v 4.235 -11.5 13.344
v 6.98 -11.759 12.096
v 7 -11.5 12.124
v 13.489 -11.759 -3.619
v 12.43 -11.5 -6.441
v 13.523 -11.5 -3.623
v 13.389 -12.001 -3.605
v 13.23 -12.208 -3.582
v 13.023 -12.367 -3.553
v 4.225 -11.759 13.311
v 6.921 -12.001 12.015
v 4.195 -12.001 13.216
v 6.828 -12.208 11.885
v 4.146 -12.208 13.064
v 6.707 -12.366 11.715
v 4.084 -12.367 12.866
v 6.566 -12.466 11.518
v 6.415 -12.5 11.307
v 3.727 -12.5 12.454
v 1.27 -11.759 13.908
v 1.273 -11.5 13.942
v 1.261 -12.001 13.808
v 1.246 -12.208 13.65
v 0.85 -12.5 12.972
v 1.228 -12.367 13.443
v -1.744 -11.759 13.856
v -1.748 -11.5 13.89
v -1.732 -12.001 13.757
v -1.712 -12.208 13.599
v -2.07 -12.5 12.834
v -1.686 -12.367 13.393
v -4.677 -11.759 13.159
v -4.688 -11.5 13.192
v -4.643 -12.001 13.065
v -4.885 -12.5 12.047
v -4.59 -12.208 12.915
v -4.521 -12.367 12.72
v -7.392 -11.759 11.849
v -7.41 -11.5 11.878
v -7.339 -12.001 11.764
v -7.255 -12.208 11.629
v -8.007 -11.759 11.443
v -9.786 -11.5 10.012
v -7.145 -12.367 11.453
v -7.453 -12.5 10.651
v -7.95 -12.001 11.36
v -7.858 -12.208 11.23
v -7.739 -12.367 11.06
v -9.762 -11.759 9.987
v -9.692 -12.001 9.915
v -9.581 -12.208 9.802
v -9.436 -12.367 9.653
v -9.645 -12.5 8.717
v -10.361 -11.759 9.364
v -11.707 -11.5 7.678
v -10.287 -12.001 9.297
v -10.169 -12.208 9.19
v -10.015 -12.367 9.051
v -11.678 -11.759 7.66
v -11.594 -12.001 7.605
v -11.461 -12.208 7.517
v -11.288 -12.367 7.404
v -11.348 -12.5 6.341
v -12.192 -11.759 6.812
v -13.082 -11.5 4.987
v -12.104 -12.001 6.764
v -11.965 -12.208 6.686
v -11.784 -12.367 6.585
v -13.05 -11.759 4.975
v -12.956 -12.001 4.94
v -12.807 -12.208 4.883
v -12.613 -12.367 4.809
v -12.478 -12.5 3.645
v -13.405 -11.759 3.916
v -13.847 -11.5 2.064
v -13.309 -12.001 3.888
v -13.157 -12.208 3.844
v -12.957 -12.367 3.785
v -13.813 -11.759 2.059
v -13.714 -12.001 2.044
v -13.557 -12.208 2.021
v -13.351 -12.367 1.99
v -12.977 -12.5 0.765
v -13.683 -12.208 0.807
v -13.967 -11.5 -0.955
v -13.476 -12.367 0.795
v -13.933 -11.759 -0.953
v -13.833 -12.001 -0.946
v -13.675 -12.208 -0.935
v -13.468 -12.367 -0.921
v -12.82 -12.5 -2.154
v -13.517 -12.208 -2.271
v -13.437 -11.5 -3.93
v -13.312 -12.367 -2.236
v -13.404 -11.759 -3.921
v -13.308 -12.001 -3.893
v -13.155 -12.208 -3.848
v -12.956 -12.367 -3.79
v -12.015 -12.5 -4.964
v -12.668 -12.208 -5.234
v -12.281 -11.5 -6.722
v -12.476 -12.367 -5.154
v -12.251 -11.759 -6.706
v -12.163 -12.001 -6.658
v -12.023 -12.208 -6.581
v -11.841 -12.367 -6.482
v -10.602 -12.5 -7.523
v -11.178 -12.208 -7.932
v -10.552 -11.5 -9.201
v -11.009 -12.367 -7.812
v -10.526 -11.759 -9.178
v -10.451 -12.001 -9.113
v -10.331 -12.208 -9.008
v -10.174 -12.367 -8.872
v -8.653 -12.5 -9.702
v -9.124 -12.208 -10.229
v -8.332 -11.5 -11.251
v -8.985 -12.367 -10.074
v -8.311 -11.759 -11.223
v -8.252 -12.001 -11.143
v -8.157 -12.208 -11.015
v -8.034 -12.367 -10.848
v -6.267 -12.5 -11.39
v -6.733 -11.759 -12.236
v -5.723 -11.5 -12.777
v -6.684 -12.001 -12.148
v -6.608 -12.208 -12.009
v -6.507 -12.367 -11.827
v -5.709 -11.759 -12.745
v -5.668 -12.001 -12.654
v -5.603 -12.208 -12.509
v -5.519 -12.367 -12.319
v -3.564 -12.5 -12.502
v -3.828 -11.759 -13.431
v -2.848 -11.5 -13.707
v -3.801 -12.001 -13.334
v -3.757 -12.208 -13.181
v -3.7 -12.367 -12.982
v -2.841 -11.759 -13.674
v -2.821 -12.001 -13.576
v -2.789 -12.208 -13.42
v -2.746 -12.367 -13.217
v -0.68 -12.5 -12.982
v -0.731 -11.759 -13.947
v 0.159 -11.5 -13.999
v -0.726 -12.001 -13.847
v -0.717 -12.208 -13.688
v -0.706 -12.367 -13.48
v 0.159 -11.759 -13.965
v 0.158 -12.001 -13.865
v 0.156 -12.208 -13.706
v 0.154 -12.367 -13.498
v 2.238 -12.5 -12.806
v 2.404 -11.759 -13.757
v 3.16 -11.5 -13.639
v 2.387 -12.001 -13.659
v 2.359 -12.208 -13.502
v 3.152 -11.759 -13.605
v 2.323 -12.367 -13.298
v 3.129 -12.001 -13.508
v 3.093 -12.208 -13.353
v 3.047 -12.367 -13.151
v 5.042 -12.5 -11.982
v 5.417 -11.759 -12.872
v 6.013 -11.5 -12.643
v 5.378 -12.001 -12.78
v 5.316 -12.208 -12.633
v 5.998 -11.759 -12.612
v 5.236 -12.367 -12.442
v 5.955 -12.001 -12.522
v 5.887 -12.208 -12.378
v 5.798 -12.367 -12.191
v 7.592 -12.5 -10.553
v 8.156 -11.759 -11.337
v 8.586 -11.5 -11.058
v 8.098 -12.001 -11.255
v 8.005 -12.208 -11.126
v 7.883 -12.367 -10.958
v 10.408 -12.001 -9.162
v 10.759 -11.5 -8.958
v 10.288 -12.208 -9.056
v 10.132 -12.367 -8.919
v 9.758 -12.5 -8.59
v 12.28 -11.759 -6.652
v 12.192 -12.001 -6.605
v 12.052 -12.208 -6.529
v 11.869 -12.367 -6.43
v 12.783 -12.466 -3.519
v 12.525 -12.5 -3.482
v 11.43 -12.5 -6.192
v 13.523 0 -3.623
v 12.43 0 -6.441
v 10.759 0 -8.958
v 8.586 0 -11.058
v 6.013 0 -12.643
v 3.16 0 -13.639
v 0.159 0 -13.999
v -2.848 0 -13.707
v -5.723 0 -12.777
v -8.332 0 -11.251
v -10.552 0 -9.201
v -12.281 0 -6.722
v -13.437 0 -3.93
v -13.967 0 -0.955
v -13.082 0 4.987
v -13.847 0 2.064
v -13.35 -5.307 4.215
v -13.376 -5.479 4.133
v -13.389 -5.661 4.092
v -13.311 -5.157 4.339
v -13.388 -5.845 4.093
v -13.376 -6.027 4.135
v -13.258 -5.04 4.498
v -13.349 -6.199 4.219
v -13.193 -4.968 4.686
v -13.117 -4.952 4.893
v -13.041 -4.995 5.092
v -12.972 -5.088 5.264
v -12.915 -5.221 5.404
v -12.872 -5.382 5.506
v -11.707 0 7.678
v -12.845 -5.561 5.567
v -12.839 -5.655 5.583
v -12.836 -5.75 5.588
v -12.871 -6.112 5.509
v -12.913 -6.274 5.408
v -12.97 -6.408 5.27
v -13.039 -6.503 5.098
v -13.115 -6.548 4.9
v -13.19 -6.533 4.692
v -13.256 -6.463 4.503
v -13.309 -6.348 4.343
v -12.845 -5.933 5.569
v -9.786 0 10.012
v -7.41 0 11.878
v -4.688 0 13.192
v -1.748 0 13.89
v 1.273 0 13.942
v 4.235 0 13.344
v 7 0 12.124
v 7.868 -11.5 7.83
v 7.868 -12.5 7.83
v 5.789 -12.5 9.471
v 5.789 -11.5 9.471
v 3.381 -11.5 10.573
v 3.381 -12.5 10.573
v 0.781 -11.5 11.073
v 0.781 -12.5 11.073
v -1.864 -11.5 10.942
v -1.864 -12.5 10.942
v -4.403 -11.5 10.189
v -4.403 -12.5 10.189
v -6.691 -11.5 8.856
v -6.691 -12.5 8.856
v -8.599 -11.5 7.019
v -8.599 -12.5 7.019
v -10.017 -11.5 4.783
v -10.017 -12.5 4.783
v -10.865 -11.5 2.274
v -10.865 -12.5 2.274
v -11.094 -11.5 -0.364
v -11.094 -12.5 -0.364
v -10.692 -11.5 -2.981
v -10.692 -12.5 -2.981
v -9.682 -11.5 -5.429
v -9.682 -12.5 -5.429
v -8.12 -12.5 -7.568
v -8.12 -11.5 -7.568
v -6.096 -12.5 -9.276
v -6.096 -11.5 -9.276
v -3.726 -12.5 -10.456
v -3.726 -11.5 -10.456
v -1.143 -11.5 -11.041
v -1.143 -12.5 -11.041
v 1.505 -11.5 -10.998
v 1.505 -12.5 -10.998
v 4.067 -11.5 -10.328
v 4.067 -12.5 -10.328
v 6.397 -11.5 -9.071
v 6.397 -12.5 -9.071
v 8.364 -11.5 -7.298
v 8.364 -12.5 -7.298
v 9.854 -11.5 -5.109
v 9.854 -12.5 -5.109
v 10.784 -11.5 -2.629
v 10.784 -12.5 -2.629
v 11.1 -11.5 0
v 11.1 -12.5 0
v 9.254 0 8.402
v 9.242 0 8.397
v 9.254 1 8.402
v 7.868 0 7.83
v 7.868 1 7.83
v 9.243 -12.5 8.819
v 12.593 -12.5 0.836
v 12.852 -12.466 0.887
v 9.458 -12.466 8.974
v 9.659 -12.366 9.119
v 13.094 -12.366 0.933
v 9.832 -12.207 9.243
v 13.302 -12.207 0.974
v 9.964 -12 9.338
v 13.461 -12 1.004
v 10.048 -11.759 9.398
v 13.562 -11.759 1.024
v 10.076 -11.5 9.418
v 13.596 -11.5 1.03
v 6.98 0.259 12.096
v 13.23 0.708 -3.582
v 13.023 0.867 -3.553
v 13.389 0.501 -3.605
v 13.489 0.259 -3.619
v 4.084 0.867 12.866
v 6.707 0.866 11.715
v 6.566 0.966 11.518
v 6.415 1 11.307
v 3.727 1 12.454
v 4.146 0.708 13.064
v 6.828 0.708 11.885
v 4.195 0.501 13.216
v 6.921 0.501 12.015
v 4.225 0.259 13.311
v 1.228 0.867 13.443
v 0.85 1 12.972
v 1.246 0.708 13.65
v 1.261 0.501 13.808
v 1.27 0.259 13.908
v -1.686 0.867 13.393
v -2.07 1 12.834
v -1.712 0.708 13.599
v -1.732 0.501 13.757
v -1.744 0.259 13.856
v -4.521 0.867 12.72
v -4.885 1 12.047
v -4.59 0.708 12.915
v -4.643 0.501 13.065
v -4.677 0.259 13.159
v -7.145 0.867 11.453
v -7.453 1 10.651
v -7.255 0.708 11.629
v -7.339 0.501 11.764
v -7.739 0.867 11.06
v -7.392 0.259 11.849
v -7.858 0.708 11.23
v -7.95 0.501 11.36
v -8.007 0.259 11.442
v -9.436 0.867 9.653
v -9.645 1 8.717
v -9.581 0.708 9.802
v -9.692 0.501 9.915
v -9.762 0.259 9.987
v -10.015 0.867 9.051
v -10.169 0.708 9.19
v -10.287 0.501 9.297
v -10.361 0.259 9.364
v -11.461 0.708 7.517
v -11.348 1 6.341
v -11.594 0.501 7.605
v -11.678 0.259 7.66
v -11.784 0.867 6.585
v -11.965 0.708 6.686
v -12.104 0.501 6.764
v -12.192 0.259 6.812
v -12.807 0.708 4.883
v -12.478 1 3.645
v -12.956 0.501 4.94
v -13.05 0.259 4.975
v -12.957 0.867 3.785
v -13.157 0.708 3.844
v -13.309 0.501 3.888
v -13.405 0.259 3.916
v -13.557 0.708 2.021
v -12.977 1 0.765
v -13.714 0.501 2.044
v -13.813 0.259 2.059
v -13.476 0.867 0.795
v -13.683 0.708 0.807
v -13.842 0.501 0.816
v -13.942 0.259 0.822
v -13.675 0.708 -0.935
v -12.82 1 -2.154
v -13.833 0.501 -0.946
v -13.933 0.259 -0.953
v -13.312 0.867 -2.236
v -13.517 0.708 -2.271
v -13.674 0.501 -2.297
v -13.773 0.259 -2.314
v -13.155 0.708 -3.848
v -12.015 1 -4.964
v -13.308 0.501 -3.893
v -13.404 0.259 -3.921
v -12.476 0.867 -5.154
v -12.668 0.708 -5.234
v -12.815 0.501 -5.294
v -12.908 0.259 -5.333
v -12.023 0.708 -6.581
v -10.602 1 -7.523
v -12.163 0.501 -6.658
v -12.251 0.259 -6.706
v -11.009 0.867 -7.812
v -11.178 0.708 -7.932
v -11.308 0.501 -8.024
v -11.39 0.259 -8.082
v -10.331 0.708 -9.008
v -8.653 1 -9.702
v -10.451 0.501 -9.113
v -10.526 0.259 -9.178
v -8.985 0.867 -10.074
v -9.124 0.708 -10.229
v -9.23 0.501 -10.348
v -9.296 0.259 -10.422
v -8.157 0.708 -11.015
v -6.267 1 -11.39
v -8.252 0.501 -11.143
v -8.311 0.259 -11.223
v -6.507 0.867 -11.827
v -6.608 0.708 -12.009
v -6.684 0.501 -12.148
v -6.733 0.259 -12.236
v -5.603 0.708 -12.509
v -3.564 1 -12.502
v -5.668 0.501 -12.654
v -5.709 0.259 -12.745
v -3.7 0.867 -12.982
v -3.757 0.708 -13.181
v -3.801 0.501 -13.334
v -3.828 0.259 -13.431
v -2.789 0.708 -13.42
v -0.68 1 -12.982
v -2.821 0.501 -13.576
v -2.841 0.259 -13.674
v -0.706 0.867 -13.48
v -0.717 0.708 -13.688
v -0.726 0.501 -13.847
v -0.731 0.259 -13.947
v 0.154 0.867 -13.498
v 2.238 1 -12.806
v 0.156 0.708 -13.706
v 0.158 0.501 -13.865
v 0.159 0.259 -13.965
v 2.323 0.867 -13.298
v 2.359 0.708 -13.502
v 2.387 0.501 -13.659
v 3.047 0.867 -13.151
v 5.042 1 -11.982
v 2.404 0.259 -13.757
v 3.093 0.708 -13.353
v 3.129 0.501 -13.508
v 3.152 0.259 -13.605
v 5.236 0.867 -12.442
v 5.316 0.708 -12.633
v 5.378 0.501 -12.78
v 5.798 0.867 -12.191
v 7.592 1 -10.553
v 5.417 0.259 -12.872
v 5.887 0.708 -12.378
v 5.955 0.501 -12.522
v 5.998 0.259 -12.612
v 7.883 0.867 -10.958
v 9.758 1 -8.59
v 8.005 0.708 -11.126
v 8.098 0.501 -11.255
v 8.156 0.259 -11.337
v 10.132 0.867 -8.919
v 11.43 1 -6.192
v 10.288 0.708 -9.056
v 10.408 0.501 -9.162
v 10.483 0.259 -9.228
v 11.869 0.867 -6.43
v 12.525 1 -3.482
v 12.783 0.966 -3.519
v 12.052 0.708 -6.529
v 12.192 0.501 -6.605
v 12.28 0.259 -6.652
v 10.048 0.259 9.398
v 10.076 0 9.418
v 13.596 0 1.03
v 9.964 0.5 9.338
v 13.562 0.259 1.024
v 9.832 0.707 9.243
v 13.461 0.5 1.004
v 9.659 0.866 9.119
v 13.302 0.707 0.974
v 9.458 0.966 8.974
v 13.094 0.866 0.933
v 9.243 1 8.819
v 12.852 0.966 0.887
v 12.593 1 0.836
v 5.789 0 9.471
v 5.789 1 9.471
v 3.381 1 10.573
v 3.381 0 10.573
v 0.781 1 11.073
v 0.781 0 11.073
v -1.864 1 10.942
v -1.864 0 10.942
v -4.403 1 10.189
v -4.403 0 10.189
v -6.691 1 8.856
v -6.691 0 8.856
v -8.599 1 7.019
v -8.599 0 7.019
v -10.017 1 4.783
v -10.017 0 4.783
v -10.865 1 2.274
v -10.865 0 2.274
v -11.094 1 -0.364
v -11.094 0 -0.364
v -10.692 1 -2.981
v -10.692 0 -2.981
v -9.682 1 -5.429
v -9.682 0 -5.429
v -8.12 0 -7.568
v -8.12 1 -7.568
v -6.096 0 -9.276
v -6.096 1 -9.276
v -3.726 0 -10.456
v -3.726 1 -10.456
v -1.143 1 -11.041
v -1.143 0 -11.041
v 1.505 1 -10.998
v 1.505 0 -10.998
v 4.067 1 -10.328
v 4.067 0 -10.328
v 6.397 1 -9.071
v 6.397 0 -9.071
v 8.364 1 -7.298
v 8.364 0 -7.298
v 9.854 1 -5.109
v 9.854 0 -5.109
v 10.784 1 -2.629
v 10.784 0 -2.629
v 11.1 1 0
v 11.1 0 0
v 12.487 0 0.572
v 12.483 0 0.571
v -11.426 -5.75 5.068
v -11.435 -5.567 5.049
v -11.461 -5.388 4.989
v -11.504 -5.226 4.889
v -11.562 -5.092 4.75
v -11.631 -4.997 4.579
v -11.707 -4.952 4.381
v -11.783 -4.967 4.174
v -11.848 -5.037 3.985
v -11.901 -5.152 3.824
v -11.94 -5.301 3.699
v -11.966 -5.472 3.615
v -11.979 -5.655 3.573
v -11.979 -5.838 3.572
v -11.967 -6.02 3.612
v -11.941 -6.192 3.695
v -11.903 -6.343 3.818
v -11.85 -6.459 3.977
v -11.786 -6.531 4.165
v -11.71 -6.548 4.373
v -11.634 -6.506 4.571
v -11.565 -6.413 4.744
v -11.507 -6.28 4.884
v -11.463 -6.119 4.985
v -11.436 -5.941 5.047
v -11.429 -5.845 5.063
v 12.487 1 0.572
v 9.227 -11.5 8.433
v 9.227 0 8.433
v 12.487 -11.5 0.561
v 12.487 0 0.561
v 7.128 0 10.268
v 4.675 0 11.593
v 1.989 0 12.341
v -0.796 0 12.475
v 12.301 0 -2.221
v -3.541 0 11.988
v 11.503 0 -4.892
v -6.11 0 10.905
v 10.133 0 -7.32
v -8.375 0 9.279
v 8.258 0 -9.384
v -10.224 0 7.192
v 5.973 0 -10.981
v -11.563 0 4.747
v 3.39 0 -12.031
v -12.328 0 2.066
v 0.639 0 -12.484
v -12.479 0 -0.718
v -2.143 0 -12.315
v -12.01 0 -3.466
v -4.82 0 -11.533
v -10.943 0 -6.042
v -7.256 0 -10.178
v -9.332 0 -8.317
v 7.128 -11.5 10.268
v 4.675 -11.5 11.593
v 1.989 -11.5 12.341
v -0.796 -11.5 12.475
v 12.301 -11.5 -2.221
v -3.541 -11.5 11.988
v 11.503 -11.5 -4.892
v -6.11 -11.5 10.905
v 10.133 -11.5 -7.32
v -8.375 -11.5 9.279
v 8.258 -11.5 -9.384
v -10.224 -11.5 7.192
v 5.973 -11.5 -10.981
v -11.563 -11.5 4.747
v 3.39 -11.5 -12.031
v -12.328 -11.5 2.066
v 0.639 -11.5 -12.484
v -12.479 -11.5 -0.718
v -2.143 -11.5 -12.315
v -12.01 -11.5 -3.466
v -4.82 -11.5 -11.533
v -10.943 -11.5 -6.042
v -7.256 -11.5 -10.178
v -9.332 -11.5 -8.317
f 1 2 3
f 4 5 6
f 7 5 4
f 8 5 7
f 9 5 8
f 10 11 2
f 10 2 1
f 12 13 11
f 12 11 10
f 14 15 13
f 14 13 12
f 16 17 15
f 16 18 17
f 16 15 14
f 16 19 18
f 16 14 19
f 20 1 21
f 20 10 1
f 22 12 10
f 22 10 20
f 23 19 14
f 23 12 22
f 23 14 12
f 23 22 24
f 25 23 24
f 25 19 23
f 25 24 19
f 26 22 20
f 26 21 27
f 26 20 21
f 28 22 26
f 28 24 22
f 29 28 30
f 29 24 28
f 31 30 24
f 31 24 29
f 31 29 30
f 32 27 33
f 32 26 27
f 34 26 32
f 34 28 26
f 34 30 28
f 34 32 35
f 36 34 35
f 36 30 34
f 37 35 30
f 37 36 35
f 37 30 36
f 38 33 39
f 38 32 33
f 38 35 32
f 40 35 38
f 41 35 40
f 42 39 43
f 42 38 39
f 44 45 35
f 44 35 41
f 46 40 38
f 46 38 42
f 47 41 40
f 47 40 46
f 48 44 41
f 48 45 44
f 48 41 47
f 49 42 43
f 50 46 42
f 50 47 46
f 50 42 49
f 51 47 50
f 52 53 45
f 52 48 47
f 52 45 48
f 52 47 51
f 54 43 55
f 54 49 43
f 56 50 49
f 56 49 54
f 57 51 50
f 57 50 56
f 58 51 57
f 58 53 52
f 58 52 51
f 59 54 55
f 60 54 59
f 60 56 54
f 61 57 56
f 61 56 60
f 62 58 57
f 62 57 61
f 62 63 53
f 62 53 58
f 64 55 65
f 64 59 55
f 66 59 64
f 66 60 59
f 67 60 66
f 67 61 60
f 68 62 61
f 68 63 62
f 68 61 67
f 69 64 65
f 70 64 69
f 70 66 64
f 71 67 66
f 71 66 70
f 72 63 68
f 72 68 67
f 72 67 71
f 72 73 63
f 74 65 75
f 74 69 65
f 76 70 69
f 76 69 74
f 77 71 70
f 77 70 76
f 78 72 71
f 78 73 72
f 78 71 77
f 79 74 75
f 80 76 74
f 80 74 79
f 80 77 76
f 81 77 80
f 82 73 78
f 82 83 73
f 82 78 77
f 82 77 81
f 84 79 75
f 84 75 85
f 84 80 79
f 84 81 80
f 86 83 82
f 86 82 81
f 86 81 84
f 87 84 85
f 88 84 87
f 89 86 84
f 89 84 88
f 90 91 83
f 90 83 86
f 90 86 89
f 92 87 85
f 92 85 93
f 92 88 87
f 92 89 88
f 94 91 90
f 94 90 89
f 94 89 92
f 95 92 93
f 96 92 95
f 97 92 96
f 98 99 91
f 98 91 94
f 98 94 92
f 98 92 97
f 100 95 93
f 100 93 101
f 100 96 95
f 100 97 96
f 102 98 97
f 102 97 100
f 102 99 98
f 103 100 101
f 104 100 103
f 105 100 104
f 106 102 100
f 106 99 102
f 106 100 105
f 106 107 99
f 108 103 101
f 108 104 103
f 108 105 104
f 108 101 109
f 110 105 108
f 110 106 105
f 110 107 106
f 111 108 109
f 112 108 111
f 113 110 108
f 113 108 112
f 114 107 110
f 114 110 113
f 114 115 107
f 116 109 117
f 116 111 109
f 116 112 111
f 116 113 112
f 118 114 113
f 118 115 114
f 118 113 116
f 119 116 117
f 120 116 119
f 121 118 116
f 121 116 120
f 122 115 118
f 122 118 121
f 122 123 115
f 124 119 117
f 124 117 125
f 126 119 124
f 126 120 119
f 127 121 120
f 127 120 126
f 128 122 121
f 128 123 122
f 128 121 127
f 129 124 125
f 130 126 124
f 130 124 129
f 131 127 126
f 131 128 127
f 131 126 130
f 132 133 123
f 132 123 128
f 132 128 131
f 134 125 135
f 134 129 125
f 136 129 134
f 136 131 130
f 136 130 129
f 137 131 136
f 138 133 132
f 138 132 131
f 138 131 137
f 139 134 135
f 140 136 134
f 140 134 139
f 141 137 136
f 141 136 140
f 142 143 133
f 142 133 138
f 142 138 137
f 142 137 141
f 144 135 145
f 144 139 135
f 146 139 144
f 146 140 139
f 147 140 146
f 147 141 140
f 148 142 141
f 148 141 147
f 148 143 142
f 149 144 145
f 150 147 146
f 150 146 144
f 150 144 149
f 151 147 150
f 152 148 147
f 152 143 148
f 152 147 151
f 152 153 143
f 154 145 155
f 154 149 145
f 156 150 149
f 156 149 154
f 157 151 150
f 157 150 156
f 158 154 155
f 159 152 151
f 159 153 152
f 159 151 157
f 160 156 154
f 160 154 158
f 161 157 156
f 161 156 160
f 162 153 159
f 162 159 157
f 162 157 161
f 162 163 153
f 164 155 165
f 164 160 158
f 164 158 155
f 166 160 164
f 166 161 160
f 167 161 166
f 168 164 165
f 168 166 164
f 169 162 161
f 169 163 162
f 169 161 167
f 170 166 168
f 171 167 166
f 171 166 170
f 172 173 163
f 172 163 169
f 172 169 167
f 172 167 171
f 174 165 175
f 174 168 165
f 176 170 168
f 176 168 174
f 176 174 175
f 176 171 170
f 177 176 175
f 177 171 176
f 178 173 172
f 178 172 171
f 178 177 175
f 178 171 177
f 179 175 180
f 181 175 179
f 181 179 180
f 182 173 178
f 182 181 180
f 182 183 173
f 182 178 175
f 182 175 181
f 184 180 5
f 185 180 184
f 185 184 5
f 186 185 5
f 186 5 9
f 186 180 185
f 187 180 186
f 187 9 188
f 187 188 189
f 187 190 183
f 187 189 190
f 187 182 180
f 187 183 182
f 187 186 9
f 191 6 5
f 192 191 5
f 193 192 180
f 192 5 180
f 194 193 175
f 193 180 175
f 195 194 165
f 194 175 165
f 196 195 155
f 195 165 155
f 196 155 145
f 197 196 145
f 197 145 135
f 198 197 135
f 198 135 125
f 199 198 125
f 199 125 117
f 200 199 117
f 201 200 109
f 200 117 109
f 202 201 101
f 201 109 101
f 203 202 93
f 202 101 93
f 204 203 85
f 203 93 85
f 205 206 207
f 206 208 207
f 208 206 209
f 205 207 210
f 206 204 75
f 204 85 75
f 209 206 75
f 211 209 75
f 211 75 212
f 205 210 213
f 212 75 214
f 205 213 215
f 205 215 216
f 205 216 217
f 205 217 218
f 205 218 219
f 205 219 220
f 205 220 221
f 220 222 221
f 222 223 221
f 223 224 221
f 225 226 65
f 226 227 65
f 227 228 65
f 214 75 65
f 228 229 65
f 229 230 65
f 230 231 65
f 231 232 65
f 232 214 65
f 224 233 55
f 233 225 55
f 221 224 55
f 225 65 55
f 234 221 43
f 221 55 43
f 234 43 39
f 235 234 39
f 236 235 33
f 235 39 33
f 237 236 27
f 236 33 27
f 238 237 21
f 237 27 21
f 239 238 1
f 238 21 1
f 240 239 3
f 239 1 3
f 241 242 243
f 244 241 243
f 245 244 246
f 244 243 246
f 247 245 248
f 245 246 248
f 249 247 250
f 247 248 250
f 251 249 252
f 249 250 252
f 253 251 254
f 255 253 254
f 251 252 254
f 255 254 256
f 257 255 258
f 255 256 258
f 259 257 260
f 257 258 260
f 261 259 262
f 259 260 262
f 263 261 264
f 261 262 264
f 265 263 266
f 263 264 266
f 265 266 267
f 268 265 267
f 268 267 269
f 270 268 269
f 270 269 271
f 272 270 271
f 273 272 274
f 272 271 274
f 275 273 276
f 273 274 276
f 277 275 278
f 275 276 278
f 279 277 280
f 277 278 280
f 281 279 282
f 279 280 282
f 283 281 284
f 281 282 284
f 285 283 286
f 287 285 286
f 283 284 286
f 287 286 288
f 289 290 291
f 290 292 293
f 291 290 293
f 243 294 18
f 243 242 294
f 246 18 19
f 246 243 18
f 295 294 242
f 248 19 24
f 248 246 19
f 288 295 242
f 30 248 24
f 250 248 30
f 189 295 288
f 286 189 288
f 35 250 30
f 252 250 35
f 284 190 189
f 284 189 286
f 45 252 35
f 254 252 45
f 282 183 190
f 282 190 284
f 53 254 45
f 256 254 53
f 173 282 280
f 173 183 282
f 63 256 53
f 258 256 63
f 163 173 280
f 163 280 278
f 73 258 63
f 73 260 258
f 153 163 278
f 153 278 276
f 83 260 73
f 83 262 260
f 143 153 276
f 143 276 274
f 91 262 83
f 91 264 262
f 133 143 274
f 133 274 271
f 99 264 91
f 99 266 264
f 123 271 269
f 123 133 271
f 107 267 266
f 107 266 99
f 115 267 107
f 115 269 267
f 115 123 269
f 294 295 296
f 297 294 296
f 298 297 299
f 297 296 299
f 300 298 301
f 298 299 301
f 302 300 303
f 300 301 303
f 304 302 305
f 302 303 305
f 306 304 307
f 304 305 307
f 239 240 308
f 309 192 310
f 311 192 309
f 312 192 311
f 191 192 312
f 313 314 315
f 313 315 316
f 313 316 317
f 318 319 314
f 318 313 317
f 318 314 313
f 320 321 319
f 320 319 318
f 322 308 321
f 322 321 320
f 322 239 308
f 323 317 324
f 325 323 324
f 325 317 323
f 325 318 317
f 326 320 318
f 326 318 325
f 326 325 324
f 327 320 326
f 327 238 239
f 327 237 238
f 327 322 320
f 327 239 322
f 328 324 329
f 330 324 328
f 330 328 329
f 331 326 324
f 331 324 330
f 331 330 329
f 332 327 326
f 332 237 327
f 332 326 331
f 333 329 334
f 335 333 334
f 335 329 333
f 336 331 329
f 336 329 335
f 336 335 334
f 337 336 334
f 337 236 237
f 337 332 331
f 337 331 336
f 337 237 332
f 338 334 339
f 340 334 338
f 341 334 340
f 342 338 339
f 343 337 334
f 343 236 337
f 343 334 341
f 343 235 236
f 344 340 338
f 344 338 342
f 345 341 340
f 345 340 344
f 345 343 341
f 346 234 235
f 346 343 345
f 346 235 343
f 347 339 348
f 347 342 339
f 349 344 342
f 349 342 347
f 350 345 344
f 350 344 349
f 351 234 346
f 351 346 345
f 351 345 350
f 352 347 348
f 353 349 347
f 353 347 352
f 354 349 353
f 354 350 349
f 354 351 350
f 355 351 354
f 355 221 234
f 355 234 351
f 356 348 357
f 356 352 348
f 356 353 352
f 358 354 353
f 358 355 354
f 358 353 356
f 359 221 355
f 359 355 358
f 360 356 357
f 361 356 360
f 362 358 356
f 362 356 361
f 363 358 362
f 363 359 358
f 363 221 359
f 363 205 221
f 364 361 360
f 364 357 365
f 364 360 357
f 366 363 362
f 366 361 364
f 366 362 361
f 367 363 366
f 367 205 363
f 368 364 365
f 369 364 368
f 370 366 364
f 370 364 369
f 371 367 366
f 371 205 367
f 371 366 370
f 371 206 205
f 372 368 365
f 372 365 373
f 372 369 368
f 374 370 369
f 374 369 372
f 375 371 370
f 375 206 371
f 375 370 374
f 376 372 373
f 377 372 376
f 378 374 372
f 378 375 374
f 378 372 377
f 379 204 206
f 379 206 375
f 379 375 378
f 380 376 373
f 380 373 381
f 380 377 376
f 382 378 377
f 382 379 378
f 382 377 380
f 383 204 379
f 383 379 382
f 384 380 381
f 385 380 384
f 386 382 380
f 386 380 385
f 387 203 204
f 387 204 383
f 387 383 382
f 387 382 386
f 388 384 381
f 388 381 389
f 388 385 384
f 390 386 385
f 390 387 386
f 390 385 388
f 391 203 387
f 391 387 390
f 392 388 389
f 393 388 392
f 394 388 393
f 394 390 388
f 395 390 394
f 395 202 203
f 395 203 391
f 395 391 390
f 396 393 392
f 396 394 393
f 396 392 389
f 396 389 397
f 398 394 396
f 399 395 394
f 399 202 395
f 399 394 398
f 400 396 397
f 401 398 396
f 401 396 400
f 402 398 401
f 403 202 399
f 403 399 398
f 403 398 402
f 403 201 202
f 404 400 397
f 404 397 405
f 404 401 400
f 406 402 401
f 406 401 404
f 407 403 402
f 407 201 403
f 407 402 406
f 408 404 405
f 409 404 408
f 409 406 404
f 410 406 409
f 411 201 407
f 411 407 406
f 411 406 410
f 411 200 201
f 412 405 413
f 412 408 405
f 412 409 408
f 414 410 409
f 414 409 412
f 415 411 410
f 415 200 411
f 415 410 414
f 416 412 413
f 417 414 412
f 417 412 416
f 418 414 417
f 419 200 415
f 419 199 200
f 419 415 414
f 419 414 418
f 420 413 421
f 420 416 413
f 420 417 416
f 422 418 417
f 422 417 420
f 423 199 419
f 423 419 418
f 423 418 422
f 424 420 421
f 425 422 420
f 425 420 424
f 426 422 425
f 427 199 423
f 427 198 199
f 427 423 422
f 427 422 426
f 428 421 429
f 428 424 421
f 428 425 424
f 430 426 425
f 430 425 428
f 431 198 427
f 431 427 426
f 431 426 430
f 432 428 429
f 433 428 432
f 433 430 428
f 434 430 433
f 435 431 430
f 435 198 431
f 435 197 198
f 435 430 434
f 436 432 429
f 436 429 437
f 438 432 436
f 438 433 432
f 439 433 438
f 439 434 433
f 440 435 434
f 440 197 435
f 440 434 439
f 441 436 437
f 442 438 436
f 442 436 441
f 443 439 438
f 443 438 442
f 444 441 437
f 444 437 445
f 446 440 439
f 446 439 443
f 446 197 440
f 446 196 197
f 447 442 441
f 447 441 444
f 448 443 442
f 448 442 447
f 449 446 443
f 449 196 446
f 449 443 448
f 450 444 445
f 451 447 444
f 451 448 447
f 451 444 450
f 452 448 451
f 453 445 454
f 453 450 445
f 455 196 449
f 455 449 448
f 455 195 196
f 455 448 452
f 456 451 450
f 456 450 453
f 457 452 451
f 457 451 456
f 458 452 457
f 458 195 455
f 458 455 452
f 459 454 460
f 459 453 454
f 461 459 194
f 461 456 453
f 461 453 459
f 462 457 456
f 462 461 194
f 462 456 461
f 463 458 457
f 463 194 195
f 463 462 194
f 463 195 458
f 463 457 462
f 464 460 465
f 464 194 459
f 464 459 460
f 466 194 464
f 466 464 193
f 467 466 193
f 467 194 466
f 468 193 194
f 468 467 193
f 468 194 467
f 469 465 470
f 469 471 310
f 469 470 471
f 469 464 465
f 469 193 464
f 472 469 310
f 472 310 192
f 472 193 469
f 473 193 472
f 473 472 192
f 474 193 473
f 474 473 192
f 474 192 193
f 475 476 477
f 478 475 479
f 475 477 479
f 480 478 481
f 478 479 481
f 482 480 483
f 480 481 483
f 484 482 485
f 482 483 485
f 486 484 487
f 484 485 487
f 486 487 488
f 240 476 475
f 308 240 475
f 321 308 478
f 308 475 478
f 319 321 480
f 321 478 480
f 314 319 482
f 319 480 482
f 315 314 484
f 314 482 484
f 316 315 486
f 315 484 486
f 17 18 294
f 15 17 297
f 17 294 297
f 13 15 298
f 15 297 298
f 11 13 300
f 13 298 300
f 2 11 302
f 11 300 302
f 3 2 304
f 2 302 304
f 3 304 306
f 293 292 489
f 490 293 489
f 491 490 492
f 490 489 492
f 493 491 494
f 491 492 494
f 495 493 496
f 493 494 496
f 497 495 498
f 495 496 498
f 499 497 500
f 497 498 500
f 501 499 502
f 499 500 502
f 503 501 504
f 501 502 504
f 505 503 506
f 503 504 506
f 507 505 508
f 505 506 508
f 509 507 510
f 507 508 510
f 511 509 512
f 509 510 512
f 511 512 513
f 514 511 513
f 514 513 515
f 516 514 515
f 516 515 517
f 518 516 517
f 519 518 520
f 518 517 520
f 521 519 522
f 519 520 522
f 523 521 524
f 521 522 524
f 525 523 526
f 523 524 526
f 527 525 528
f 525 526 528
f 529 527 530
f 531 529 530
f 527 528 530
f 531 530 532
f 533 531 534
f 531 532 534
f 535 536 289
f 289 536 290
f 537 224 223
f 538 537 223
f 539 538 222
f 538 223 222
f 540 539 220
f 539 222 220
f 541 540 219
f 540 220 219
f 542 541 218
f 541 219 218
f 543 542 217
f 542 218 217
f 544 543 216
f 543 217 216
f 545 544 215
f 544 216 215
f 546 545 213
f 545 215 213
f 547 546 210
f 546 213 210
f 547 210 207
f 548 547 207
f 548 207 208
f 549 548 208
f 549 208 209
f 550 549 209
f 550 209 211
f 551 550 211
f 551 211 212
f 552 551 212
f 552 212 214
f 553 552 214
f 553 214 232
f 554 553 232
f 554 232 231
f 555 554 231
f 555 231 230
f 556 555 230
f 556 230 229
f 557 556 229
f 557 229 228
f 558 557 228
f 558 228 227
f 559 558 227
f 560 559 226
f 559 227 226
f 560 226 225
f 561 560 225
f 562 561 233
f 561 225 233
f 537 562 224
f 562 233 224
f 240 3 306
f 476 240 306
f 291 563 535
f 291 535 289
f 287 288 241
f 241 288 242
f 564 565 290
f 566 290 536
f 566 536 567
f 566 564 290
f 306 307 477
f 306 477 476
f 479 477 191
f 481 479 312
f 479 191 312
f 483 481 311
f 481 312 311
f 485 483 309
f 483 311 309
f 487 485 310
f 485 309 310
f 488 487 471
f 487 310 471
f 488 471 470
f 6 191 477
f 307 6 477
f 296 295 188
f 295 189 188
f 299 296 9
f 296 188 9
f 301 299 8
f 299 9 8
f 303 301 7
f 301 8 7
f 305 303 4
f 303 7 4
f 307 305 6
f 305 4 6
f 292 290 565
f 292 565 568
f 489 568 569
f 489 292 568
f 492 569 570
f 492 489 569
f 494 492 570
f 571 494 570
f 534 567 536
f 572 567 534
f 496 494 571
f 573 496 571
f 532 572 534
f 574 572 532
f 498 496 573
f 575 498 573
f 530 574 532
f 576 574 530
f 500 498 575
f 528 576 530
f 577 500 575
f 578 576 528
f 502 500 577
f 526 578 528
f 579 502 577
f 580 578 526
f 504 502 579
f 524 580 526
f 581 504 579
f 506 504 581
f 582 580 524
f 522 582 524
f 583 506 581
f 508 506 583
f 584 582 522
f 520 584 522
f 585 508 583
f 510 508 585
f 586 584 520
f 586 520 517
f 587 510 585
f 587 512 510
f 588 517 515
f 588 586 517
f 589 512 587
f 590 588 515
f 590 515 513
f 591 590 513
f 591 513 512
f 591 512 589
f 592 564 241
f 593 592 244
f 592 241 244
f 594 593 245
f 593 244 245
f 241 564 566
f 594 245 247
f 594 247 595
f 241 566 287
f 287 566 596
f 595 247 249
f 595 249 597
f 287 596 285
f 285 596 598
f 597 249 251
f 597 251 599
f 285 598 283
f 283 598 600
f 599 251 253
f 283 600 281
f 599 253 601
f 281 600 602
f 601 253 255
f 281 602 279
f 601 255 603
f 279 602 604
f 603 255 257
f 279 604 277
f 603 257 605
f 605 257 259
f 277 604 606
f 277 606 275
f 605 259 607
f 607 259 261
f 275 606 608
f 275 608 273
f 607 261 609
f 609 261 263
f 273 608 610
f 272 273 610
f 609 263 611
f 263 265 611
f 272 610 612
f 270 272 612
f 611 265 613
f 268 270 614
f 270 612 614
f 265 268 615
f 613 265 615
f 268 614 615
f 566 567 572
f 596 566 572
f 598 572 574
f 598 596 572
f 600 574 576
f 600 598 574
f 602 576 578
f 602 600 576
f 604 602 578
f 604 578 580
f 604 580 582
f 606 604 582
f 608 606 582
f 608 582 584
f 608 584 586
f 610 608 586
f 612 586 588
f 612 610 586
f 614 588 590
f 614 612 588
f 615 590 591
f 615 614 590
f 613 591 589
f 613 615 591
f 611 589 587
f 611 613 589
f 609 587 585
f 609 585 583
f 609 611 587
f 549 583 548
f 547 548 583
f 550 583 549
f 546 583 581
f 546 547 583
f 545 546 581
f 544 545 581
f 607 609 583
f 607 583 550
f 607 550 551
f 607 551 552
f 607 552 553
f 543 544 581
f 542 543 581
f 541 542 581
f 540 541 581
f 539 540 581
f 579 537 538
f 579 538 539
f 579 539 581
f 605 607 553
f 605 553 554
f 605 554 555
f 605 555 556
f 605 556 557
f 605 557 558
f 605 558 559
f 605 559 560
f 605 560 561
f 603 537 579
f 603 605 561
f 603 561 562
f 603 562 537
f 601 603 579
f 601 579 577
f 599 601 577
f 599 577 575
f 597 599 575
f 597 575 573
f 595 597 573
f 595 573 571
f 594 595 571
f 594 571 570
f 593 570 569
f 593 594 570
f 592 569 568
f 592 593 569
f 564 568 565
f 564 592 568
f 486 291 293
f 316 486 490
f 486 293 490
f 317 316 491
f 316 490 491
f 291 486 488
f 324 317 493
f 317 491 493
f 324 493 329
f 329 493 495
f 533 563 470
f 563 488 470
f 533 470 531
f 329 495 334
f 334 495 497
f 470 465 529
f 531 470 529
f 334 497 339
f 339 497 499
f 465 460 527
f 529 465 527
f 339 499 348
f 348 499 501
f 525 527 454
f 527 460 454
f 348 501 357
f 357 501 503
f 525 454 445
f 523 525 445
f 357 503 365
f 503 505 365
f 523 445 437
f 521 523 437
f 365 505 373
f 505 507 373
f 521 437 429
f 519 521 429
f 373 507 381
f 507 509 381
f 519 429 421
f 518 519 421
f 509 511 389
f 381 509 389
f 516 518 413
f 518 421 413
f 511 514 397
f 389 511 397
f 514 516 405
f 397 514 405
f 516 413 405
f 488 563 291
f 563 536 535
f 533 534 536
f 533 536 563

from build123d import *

# Parameters (mm, degrees)
EXTRUDE_1_DEPTH     = 1
EXTRUDE_START       = 11.5
EXTRUDE_3_DEPTH     = 11.5
EXTRUDE_START_2     = 1
EXTRUDE_4_DEPTH     = 1
FILLET_1_R          = 1
FILLET_2_R          = 1
SKETCH_7_W          = 8.471052631578948
SKETCH_7_H          = 1
CUT_EXTRUDE_1_DEPTH = 1.5
SKETCH2_R           = 0.8000000000000002
CUT_EXTRUDE1_DEPTH  = 10


with BuildPart() as part:
    # 草图1 → 凸台-拉伸1 (new body)
    with BuildSketch(Plane(origin=(0, 0, 0), x_dir=(1, 0, 0), z_dir=(0, 1, 0))):
        with BuildLine():
            Line((13.595707880639235, -1.030263157894738), (10.075971038533972, -9.418398712579371))
            Line((10.075971038533972, -9.418398712579371), (7, -12.12435565298214))
            ThreePointArc((7, -12.12435565298214), (-12.93431345515802, 5.357568053111247), (13.522961568046952, 3.6234666314353032))
            Line((13.522961568046952, 3.6234666314353032), (13.595707880639235, -1.030263157894738))
        make_face()
        with BuildLine():
            Line((11.1, 0), (7.867624653739615, -7.830101040718992))
            ThreePointArc((7.867624653739615, -7.830101040718992), (-10.260132398183506, 4.235526315789474), (11.1, 0))
        make_face(mode=Mode.SUBTRACT)
    extrude(amount=EXTRUDE_1_DEPTH)

    # 草图2 → 凸台-拉伸3 (add)
    with BuildSketch(Plane(origin=(0, 0, 0), x_dir=(-1, 0, 0), z_dir=(0, -1, 0)).offset(EXTRUDE_START)):
        with BuildLine():
            Line((-13.595707880639234, -1.030263157894738), (-13.52296156804698, 3.6234666314351993))
            ThreePointArc((-13.52296156804698, 3.6234666314351993), (12.934313455157998, 5.357568053111296), (-7, -12.12435565298214))
            Line((-7, -12.12435565298214), (-10.07597103853397, -9.418398712579371))
            Line((-10.07597103853397, -9.418398712579371), (-13.595707880639234, -1.030263157894738))
        make_face()
        with BuildLine():
            Line((-9.226675534749763, -8.43317606696612), (-12.487400822321415, -0.5610888545377466))
            ThreePointArc((-12.487400822321415, -0.5610888545377466), (11.548494156391081, 4.783542904563626), (-9.226675534749763, -8.43317606696612))
        make_face(mode=Mode.SUBTRACT)
    extrude(amount=-EXTRUDE_3_DEPTH)

    # 草图5 → 凸台-拉伸4 (add)
    with BuildSketch(Plane(origin=(0, -11.5, 0), x_dir=(-1, 0, 0), z_dir=(0, -1, 0)).offset(EXTRUDE_START_2)):
        with BuildLine():
            Line((-13.522961568046979, 3.6234666314352), (-13.595707880639234, -1.030263157894738))
            Line((-13.595707880639234, -1.030263157894738), (-10.07597103853397, -9.418398712579371))
            Line((-10.07597103853397, -9.418398712579371), (-7.0000000000000115, -12.124355652982132))
            ThreePointArc((-7.0000000000000115, -12.124355652982132), (12.934313455157996, 5.3575680531112955), (-13.522961568046979, 3.6234666314352))
        make_face()
        with BuildLine():
            Line((-11.099999999999998, 0), (-7.867624653739613, -7.830101040718992))
            ThreePointArc((-7.867624653739613, -7.830101040718992), (10.260132398183506, 4.235526315789473), (-11.099999999999998, 0))
        make_face(mode=Mode.SUBTRACT)
    extrude(amount=-EXTRUDE_4_DEPTH)

    # 圆角1
    # the kernel refuses this fillet: 1 mm, written as the material it takes off along each edge
    with BuildSketch(Plane(origin=(11.953026446892592, -12.5, 7.767137681139568), x_dir=(-0.6605044125759219, 0, -0.7508221633434488), z_dir=(-0.7508221633434488, 0, 0.6605044125759219))) as fillet_1_piece_1:
        with BuildLine():
            CenterArc((FILLET_1_R, -FILLET_1_R), FILLET_1_R, 90, 90)
            Line((-1.17e-15, -FILLET_1_R), (0, 0))
            Line((0, 0), (FILLET_1_R, 0))
        make_face()
    extrude(amount=9.096803728910325, mode=Mode.SUBTRACT)
    with BuildSketch(Plane(origin=(1.33e-15, -12.5, -1.33e-15), x_dir=(0.6464264276811541, 0, 0.7629763257109501), z_dir=(0.7629763257109501, 0, -0.6464264276811541))) as fillet_1_piece_2:
        with BuildLine():
            CenterArc((14.000000000000002 - FILLET_1_R, -FILLET_1_R), FILLET_1_R, 0, 89.9999999999999)
            Line((14.000000000000002 - FILLET_1_R, 0), (14.000000000000002, 0))
            Line((14.000000000000002, 0), (14.000000000000002, -FILLET_1_R))
        make_face()
    revolve(axis=Axis((1.33e-15, -12.5, -1.33e-15), (0, -1, 0)), revolution_arc=305.54541710396313, mode=Mode.SUBTRACT)
    with BuildSketch(Plane(origin=(13.483886766982303, -12.5, -6.123161244767347), x_dir=(-1e-17, 1, 0), z_dir=(0.015629920425854232, 0, 0.9998778453328594))) as fillet_1_piece_3:
        with BuildLine():
            CenterArc((FILLET_1_R, FILLET_1_R), FILLET_1_R, 180, 90)
            Line((1e-17, FILLET_1_R), (0, 0))
            Line((0, 0), (FILLET_1_R, 0))
        make_face()
    extrude(amount=9.654298333593651, mode=Mode.SUBTRACT)
    with BuildSketch(Plane(origin=(14.563022756193803, -12.5, -1.275013817119511), x_dir=(9.6e-16, 1, 4e-16), z_dir=(-0.386925950221828, 0, 0.9221107900056997))) as fillet_1_piece_4:
        with BuildLine():
            CenterArc((FILLET_1_R, FILLET_1_R), FILLET_1_R, 180, 90.00000000000006)
            Line((-1.04e-15, FILLET_1_R), (0, 0))
            Line((0, 0), (FILLET_1_R, 0))
        make_face()
    extrude(amount=14.0966678251675, mode=Mode.SUBTRACT)

    # 圆角2
    # the kernel refuses this fillet: 1 mm, written as the material it takes off along each edge
    with BuildSketch(Plane(origin=(13.483886766982302, 1, -6.123161244767451), x_dir=(-1e-17, -1, 0), z_dir=(0.01562992042585999, 0, 0.9998778453328593))) as fillet_2_piece_1:
        with BuildLine():
            CenterArc((FILLET_2_R, -FILLET_2_R), FILLET_2_R, 90, 90)
            Line((1e-17, -FILLET_2_R), (0, 0))
            Line((0, 0), (FILLET_2_R, 0))
        make_face()
    extrude(amount=9.654298333593754, mode=Mode.SUBTRACT)
    with BuildSketch(Plane(origin=(-1.19e-15, 1, 1.55e-15), x_dir=(0.6464264276811535, 0, 0.7629763257109505), z_dir=(0.7629763257109505, 0, -0.6464264276811535))) as fillet_2_piece_2:
        with BuildLine():
            CenterArc((14.000000000000002 - FILLET_2_R, FILLET_2_R), FILLET_2_R, 270, 90)
            Line((14.000000000000002 - FILLET_2_R, 0), (14.000000000000002, 0))
            Line((14.000000000000002, 0), (14.000000000000002, FILLET_2_R))
        make_face()
    revolve(axis=Axis((-1.19e-15, 1, 1.55e-15), (0, -1, 0)), revolution_arc=305.54541710396273, mode=Mode.SUBTRACT)
    with BuildSketch(Plane(origin=(11.953026446892594, 1, 7.767137681139568), x_dir=(-0.6605044125759215, 0, -0.7508221633434492), z_dir=(-0.7508221633434492, 0, 0.6605044125759215))) as fillet_2_piece_3:
        with BuildLine():
            CenterArc((FILLET_2_R, FILLET_2_R), FILLET_2_R, 180, 90)
            Line((6.7e-16, FILLET_2_R), (0, 0))
            Line((0, 0), (FILLET_2_R, 0))
        make_face()
    extrude(amount=9.096803728910341, mode=Mode.SUBTRACT)
    with BuildSketch(Plane(origin=(14.563022756193805, 1, -1.2750138171195122), x_dir=(-0.9221107900056996, 0, -0.38692595022182796), z_dir=(-0.386925950221828, 0, 0.9221107900056997))) as fillet_2_piece_4:
        with BuildLine():
            CenterArc((FILLET_2_R, FILLET_2_R), FILLET_2_R, 180, 90)
            Line((-1e-17, FILLET_2_R), (0, 0))
            Line((0, 0), (FILLET_2_R, 0))
        make_face()
    extrude(amount=14.096667825167504, mode=Mode.SUBTRACT)

    # 草图7 → 切除-拉伸1 (cut)
    with BuildSketch(Plane(origin=(9.483812326869804, 0, 3.915050520359493), x_dir=(-0.3815789473684208, 0, 0.9243362520886044), z_dir=(-0.9243362520886044, 0, -0.3815789473684208))):
        with Locations((2.66e-15, 0.5)):
            Rectangle(SKETCH_7_W, SKETCH_7_H)
    extrude(amount=-CUT_EXTRUDE_1_DEPTH, mode=Mode.SUBTRACT)

    # Sketch2 → Cut-Extrude1 (cut)
    with BuildSketch(Plane(origin=(-13.134678702914778, 0, 4.845638799084908), x_dir=(0.3461170570774934, 0, 0.938191335922484), z_dir=(-0.938191335922484, 0, 0.34611705707749346))):
        with Locations((0, -5.75)):
            Circle(SKETCH2_R)
    extrude(amount=-CUT_EXTRUDE1_DEPTH, mode=Mode.SUBTRACT)


solid = part.part
